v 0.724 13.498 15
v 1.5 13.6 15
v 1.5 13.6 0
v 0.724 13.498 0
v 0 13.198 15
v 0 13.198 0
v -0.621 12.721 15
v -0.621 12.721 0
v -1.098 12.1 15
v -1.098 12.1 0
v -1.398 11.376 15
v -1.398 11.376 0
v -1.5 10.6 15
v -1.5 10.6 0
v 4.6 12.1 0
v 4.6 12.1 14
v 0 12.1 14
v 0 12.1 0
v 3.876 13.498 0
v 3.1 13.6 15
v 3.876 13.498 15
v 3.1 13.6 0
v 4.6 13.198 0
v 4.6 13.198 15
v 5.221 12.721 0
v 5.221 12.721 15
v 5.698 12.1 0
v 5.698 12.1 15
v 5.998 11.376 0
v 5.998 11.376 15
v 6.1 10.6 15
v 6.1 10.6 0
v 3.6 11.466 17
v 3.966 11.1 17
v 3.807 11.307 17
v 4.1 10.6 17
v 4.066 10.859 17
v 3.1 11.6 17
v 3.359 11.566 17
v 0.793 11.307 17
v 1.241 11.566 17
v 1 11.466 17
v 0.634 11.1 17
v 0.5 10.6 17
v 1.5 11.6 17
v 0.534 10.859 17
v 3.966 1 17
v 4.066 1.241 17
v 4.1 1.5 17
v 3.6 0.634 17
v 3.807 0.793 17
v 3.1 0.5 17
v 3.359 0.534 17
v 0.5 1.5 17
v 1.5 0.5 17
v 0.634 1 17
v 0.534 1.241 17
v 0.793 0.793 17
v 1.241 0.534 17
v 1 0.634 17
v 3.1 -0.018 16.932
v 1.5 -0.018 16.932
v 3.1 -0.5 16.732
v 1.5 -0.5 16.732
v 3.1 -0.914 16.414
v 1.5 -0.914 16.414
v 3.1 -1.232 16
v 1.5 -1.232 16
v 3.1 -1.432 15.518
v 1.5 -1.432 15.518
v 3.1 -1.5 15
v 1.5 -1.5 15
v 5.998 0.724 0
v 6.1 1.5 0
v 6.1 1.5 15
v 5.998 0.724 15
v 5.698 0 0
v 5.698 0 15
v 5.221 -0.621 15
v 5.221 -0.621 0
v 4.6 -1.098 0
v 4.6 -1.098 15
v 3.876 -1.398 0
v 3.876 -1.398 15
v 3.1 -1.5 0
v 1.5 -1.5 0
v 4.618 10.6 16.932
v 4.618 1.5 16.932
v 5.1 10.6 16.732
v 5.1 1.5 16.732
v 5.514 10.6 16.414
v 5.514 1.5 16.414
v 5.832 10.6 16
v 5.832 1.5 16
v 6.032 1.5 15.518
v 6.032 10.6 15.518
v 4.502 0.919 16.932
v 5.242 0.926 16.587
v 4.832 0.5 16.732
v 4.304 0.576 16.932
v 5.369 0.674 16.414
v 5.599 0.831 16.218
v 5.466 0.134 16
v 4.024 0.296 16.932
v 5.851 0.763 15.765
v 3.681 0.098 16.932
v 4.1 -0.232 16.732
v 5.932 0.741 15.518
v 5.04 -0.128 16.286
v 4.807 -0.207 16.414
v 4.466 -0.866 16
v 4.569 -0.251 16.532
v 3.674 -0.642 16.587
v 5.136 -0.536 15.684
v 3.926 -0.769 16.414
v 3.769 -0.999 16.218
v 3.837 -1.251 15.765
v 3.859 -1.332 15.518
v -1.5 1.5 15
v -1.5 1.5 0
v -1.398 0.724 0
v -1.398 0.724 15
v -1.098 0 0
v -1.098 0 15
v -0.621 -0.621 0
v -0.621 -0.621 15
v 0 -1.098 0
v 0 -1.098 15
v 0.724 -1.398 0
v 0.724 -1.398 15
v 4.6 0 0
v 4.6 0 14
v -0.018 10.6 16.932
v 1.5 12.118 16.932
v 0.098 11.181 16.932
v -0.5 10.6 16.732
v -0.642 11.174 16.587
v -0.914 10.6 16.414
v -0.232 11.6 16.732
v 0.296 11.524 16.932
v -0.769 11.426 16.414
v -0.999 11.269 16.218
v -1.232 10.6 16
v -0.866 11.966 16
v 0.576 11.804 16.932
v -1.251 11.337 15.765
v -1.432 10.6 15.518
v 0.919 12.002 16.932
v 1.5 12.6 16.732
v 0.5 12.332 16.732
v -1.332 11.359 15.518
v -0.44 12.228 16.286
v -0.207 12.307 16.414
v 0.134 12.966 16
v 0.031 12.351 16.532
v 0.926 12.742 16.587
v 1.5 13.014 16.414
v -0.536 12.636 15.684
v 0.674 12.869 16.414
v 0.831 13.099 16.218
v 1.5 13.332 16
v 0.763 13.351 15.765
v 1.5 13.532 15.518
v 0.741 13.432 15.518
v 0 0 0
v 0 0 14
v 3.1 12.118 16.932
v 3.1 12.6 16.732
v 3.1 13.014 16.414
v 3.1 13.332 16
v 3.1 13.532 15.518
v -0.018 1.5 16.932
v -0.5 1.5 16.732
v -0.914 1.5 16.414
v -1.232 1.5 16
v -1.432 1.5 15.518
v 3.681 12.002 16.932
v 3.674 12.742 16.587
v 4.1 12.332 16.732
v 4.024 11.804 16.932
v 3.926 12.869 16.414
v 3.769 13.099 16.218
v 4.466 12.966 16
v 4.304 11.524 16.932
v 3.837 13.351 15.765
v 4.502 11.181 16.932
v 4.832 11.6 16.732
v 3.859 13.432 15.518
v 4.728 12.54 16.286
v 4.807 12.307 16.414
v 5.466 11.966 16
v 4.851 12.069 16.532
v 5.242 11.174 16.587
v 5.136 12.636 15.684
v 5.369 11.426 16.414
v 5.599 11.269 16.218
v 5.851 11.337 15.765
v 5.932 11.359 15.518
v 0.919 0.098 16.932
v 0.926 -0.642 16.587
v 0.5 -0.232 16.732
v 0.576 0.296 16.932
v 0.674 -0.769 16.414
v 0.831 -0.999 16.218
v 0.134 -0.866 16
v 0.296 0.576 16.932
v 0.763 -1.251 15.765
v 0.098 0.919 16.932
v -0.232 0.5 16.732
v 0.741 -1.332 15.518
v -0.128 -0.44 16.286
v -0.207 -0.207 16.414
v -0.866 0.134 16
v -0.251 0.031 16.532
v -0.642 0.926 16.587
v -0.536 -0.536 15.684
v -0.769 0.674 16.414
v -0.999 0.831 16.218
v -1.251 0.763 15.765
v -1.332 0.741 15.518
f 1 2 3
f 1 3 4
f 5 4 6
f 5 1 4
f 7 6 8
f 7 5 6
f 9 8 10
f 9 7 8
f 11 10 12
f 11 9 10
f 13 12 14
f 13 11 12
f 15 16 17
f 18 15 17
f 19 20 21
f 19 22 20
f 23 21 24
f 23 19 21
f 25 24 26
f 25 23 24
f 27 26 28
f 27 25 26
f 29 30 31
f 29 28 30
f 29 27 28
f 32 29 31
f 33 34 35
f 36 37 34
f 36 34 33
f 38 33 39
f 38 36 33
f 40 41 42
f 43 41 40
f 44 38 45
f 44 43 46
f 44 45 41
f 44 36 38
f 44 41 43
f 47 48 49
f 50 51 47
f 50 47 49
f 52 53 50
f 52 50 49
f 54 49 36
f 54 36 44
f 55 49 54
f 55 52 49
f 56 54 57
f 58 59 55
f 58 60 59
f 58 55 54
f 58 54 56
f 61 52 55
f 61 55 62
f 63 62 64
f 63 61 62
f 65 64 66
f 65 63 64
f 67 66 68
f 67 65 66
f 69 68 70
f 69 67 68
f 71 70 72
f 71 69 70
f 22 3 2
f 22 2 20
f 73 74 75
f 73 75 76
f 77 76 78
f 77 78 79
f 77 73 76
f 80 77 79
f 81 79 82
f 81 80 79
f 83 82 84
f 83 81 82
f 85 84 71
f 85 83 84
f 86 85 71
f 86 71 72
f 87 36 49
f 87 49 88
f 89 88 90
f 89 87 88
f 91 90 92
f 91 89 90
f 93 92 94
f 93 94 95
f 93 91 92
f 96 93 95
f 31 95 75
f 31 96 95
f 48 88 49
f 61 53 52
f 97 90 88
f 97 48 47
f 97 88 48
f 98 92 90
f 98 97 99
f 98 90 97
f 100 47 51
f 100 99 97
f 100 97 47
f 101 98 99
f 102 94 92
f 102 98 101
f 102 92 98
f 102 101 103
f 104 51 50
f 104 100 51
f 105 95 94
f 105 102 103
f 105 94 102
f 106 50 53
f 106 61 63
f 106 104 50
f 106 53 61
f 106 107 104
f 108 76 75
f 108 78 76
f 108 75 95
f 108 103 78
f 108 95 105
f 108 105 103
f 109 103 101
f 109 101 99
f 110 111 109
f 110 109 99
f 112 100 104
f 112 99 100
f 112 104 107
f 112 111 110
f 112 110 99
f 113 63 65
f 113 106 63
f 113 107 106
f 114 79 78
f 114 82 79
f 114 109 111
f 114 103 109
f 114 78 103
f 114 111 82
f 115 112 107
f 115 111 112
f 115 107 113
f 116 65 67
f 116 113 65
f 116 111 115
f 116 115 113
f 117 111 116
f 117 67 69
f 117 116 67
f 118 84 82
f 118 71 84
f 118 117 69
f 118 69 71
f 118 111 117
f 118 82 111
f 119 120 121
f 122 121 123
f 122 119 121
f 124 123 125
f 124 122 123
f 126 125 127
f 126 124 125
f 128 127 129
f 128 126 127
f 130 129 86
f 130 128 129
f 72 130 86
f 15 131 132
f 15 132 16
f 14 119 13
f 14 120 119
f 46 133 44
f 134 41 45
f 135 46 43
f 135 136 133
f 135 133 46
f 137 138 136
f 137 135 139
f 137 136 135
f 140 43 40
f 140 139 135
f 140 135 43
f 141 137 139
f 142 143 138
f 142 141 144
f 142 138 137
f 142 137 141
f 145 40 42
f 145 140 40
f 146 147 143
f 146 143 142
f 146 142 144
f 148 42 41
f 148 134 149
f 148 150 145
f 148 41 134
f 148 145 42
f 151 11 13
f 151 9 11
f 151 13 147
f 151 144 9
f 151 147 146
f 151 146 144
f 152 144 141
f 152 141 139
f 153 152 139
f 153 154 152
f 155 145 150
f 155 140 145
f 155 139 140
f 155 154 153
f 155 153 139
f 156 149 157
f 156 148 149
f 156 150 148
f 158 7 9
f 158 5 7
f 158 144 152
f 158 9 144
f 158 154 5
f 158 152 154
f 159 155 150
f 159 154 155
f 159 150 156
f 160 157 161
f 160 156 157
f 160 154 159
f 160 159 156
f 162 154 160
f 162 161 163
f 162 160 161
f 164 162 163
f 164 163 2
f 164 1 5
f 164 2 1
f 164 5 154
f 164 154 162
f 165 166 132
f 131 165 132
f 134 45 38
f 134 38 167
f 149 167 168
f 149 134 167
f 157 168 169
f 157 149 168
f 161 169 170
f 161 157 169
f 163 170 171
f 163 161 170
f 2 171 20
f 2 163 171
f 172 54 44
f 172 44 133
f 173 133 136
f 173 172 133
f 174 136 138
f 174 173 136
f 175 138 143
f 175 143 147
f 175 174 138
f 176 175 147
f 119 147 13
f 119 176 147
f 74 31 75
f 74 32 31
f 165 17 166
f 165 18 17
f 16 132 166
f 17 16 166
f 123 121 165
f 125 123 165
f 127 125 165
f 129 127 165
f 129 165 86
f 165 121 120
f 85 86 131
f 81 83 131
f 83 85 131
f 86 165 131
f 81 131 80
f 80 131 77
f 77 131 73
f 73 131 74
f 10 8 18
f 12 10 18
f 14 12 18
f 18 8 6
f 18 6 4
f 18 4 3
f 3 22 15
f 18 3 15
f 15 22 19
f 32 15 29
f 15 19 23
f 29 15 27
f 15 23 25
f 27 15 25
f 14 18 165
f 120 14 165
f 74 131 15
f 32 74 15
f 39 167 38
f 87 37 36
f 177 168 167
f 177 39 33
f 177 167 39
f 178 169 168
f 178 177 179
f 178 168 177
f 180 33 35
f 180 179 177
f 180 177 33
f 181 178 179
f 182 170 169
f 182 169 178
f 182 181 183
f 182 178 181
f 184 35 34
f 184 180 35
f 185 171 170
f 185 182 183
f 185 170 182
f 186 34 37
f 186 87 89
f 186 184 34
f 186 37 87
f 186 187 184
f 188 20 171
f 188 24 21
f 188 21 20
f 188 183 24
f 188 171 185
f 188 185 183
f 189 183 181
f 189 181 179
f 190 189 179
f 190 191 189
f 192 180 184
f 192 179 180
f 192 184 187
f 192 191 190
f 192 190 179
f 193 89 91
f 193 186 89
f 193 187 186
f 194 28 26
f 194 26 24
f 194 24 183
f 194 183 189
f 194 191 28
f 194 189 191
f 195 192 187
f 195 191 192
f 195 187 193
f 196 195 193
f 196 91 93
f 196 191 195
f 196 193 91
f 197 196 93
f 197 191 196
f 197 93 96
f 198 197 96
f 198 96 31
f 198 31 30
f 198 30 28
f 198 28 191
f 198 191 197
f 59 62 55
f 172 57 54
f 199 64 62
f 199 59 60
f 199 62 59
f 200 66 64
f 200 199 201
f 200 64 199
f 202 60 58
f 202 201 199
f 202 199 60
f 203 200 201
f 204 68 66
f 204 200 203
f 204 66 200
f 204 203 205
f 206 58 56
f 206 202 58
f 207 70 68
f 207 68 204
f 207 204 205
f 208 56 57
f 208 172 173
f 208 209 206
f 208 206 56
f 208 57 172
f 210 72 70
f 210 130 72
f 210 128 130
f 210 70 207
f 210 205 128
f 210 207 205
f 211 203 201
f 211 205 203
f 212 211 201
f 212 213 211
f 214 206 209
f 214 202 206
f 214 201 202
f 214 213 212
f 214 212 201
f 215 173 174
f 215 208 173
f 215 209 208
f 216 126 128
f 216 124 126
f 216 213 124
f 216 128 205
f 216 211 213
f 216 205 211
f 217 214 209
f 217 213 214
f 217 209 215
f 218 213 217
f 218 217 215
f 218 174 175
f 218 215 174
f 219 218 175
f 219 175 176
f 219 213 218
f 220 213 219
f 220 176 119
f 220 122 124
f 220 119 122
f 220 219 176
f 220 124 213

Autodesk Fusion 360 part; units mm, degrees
sketch "Sketch2" plane through (0, 0, 0) normal (0, 0, 1) x (1, 0, 0)
  line L0 (0, 0) -> (4.6, 0)
  line L1 (4.6, 0) -> (4.6, 12.1)
  line L2 (4.6, 12.1) -> (0, 12.1)
  line L3 (0, 12.1) -> (0, 0)
  line L4 (-1.5, 13.6) -> (6.1, 13.6)
  line L5 (6.1, 13.6) -> (6.1, -1.5)
  line L6 (6.1, -1.5) -> (-1.5, -1.5)
  line L7 (-1.5, -1.5) -> (-1.5, 13.6)
  dimension "d1" = 4.6
  dimension "d2" = 12.1
  dimension "d3" = 1.5
  dimension "d4" = 1.5
  dimension "d5" = 1.5
  dimension "d6" = 1.5
extrude "Extrude1" add sketch "Sketch2" along normal blind 14
sketch "Sketch3" plane through (0, 0, 14) normal (0, 0, 1) x (-1, 0, 0)
  line L0 (0, 0) -> (0, -12.1)
  line L1 (0, -12.1) -> (-4.6, -12.1)
  line L2 (-4.6, -12.1) -> (-4.6, 0)
  line L3 (-4.6, 0) -> (0, 0)
  line L4 (1.5, 1.5) -> (-6.1, 1.5)
  line L5 (-6.1, 1.5) -> (-6.1, -13.6)
  line L6 (-6.1, -13.6) -> (1.5, -13.6)
  line L7 (1.5, -13.6) -> (1.5, 1.5)
  line L8 (1.5, -13.6) -> (-6.1, -13.6)
  line L9 (-6.1, -13.6) -> (-6.1, 1.5)
  line L10 (-6.1, 1.5) -> (1.5, 1.5)
  line L11 (1.5, 1.5) -> (1.5, -13.6)
extrude "Extrude2" add sketch "Sketch3" along normal blind 3 contours L0 L1 L2 L3 | L4 L5 L6 L7 L8 L9 L10 L11
fillet "Fillet1" radius 3 4 edges at (-1.5, 13.6, 8.5) (-1.5, -1.5, 8.5) (6.1, -1.5, 8.5) (6.1, 13.6, 8.5)
fillet "Fillet1" radius 2 4 edges at (6.1, 6.05, 17) (2.3, -1.5, 17) (-1.5, 6.05, 17) (2.3, 13.6, 17)
equation "d4 = d3"
equation "d5 = d4"
equation "d6 = d3"
